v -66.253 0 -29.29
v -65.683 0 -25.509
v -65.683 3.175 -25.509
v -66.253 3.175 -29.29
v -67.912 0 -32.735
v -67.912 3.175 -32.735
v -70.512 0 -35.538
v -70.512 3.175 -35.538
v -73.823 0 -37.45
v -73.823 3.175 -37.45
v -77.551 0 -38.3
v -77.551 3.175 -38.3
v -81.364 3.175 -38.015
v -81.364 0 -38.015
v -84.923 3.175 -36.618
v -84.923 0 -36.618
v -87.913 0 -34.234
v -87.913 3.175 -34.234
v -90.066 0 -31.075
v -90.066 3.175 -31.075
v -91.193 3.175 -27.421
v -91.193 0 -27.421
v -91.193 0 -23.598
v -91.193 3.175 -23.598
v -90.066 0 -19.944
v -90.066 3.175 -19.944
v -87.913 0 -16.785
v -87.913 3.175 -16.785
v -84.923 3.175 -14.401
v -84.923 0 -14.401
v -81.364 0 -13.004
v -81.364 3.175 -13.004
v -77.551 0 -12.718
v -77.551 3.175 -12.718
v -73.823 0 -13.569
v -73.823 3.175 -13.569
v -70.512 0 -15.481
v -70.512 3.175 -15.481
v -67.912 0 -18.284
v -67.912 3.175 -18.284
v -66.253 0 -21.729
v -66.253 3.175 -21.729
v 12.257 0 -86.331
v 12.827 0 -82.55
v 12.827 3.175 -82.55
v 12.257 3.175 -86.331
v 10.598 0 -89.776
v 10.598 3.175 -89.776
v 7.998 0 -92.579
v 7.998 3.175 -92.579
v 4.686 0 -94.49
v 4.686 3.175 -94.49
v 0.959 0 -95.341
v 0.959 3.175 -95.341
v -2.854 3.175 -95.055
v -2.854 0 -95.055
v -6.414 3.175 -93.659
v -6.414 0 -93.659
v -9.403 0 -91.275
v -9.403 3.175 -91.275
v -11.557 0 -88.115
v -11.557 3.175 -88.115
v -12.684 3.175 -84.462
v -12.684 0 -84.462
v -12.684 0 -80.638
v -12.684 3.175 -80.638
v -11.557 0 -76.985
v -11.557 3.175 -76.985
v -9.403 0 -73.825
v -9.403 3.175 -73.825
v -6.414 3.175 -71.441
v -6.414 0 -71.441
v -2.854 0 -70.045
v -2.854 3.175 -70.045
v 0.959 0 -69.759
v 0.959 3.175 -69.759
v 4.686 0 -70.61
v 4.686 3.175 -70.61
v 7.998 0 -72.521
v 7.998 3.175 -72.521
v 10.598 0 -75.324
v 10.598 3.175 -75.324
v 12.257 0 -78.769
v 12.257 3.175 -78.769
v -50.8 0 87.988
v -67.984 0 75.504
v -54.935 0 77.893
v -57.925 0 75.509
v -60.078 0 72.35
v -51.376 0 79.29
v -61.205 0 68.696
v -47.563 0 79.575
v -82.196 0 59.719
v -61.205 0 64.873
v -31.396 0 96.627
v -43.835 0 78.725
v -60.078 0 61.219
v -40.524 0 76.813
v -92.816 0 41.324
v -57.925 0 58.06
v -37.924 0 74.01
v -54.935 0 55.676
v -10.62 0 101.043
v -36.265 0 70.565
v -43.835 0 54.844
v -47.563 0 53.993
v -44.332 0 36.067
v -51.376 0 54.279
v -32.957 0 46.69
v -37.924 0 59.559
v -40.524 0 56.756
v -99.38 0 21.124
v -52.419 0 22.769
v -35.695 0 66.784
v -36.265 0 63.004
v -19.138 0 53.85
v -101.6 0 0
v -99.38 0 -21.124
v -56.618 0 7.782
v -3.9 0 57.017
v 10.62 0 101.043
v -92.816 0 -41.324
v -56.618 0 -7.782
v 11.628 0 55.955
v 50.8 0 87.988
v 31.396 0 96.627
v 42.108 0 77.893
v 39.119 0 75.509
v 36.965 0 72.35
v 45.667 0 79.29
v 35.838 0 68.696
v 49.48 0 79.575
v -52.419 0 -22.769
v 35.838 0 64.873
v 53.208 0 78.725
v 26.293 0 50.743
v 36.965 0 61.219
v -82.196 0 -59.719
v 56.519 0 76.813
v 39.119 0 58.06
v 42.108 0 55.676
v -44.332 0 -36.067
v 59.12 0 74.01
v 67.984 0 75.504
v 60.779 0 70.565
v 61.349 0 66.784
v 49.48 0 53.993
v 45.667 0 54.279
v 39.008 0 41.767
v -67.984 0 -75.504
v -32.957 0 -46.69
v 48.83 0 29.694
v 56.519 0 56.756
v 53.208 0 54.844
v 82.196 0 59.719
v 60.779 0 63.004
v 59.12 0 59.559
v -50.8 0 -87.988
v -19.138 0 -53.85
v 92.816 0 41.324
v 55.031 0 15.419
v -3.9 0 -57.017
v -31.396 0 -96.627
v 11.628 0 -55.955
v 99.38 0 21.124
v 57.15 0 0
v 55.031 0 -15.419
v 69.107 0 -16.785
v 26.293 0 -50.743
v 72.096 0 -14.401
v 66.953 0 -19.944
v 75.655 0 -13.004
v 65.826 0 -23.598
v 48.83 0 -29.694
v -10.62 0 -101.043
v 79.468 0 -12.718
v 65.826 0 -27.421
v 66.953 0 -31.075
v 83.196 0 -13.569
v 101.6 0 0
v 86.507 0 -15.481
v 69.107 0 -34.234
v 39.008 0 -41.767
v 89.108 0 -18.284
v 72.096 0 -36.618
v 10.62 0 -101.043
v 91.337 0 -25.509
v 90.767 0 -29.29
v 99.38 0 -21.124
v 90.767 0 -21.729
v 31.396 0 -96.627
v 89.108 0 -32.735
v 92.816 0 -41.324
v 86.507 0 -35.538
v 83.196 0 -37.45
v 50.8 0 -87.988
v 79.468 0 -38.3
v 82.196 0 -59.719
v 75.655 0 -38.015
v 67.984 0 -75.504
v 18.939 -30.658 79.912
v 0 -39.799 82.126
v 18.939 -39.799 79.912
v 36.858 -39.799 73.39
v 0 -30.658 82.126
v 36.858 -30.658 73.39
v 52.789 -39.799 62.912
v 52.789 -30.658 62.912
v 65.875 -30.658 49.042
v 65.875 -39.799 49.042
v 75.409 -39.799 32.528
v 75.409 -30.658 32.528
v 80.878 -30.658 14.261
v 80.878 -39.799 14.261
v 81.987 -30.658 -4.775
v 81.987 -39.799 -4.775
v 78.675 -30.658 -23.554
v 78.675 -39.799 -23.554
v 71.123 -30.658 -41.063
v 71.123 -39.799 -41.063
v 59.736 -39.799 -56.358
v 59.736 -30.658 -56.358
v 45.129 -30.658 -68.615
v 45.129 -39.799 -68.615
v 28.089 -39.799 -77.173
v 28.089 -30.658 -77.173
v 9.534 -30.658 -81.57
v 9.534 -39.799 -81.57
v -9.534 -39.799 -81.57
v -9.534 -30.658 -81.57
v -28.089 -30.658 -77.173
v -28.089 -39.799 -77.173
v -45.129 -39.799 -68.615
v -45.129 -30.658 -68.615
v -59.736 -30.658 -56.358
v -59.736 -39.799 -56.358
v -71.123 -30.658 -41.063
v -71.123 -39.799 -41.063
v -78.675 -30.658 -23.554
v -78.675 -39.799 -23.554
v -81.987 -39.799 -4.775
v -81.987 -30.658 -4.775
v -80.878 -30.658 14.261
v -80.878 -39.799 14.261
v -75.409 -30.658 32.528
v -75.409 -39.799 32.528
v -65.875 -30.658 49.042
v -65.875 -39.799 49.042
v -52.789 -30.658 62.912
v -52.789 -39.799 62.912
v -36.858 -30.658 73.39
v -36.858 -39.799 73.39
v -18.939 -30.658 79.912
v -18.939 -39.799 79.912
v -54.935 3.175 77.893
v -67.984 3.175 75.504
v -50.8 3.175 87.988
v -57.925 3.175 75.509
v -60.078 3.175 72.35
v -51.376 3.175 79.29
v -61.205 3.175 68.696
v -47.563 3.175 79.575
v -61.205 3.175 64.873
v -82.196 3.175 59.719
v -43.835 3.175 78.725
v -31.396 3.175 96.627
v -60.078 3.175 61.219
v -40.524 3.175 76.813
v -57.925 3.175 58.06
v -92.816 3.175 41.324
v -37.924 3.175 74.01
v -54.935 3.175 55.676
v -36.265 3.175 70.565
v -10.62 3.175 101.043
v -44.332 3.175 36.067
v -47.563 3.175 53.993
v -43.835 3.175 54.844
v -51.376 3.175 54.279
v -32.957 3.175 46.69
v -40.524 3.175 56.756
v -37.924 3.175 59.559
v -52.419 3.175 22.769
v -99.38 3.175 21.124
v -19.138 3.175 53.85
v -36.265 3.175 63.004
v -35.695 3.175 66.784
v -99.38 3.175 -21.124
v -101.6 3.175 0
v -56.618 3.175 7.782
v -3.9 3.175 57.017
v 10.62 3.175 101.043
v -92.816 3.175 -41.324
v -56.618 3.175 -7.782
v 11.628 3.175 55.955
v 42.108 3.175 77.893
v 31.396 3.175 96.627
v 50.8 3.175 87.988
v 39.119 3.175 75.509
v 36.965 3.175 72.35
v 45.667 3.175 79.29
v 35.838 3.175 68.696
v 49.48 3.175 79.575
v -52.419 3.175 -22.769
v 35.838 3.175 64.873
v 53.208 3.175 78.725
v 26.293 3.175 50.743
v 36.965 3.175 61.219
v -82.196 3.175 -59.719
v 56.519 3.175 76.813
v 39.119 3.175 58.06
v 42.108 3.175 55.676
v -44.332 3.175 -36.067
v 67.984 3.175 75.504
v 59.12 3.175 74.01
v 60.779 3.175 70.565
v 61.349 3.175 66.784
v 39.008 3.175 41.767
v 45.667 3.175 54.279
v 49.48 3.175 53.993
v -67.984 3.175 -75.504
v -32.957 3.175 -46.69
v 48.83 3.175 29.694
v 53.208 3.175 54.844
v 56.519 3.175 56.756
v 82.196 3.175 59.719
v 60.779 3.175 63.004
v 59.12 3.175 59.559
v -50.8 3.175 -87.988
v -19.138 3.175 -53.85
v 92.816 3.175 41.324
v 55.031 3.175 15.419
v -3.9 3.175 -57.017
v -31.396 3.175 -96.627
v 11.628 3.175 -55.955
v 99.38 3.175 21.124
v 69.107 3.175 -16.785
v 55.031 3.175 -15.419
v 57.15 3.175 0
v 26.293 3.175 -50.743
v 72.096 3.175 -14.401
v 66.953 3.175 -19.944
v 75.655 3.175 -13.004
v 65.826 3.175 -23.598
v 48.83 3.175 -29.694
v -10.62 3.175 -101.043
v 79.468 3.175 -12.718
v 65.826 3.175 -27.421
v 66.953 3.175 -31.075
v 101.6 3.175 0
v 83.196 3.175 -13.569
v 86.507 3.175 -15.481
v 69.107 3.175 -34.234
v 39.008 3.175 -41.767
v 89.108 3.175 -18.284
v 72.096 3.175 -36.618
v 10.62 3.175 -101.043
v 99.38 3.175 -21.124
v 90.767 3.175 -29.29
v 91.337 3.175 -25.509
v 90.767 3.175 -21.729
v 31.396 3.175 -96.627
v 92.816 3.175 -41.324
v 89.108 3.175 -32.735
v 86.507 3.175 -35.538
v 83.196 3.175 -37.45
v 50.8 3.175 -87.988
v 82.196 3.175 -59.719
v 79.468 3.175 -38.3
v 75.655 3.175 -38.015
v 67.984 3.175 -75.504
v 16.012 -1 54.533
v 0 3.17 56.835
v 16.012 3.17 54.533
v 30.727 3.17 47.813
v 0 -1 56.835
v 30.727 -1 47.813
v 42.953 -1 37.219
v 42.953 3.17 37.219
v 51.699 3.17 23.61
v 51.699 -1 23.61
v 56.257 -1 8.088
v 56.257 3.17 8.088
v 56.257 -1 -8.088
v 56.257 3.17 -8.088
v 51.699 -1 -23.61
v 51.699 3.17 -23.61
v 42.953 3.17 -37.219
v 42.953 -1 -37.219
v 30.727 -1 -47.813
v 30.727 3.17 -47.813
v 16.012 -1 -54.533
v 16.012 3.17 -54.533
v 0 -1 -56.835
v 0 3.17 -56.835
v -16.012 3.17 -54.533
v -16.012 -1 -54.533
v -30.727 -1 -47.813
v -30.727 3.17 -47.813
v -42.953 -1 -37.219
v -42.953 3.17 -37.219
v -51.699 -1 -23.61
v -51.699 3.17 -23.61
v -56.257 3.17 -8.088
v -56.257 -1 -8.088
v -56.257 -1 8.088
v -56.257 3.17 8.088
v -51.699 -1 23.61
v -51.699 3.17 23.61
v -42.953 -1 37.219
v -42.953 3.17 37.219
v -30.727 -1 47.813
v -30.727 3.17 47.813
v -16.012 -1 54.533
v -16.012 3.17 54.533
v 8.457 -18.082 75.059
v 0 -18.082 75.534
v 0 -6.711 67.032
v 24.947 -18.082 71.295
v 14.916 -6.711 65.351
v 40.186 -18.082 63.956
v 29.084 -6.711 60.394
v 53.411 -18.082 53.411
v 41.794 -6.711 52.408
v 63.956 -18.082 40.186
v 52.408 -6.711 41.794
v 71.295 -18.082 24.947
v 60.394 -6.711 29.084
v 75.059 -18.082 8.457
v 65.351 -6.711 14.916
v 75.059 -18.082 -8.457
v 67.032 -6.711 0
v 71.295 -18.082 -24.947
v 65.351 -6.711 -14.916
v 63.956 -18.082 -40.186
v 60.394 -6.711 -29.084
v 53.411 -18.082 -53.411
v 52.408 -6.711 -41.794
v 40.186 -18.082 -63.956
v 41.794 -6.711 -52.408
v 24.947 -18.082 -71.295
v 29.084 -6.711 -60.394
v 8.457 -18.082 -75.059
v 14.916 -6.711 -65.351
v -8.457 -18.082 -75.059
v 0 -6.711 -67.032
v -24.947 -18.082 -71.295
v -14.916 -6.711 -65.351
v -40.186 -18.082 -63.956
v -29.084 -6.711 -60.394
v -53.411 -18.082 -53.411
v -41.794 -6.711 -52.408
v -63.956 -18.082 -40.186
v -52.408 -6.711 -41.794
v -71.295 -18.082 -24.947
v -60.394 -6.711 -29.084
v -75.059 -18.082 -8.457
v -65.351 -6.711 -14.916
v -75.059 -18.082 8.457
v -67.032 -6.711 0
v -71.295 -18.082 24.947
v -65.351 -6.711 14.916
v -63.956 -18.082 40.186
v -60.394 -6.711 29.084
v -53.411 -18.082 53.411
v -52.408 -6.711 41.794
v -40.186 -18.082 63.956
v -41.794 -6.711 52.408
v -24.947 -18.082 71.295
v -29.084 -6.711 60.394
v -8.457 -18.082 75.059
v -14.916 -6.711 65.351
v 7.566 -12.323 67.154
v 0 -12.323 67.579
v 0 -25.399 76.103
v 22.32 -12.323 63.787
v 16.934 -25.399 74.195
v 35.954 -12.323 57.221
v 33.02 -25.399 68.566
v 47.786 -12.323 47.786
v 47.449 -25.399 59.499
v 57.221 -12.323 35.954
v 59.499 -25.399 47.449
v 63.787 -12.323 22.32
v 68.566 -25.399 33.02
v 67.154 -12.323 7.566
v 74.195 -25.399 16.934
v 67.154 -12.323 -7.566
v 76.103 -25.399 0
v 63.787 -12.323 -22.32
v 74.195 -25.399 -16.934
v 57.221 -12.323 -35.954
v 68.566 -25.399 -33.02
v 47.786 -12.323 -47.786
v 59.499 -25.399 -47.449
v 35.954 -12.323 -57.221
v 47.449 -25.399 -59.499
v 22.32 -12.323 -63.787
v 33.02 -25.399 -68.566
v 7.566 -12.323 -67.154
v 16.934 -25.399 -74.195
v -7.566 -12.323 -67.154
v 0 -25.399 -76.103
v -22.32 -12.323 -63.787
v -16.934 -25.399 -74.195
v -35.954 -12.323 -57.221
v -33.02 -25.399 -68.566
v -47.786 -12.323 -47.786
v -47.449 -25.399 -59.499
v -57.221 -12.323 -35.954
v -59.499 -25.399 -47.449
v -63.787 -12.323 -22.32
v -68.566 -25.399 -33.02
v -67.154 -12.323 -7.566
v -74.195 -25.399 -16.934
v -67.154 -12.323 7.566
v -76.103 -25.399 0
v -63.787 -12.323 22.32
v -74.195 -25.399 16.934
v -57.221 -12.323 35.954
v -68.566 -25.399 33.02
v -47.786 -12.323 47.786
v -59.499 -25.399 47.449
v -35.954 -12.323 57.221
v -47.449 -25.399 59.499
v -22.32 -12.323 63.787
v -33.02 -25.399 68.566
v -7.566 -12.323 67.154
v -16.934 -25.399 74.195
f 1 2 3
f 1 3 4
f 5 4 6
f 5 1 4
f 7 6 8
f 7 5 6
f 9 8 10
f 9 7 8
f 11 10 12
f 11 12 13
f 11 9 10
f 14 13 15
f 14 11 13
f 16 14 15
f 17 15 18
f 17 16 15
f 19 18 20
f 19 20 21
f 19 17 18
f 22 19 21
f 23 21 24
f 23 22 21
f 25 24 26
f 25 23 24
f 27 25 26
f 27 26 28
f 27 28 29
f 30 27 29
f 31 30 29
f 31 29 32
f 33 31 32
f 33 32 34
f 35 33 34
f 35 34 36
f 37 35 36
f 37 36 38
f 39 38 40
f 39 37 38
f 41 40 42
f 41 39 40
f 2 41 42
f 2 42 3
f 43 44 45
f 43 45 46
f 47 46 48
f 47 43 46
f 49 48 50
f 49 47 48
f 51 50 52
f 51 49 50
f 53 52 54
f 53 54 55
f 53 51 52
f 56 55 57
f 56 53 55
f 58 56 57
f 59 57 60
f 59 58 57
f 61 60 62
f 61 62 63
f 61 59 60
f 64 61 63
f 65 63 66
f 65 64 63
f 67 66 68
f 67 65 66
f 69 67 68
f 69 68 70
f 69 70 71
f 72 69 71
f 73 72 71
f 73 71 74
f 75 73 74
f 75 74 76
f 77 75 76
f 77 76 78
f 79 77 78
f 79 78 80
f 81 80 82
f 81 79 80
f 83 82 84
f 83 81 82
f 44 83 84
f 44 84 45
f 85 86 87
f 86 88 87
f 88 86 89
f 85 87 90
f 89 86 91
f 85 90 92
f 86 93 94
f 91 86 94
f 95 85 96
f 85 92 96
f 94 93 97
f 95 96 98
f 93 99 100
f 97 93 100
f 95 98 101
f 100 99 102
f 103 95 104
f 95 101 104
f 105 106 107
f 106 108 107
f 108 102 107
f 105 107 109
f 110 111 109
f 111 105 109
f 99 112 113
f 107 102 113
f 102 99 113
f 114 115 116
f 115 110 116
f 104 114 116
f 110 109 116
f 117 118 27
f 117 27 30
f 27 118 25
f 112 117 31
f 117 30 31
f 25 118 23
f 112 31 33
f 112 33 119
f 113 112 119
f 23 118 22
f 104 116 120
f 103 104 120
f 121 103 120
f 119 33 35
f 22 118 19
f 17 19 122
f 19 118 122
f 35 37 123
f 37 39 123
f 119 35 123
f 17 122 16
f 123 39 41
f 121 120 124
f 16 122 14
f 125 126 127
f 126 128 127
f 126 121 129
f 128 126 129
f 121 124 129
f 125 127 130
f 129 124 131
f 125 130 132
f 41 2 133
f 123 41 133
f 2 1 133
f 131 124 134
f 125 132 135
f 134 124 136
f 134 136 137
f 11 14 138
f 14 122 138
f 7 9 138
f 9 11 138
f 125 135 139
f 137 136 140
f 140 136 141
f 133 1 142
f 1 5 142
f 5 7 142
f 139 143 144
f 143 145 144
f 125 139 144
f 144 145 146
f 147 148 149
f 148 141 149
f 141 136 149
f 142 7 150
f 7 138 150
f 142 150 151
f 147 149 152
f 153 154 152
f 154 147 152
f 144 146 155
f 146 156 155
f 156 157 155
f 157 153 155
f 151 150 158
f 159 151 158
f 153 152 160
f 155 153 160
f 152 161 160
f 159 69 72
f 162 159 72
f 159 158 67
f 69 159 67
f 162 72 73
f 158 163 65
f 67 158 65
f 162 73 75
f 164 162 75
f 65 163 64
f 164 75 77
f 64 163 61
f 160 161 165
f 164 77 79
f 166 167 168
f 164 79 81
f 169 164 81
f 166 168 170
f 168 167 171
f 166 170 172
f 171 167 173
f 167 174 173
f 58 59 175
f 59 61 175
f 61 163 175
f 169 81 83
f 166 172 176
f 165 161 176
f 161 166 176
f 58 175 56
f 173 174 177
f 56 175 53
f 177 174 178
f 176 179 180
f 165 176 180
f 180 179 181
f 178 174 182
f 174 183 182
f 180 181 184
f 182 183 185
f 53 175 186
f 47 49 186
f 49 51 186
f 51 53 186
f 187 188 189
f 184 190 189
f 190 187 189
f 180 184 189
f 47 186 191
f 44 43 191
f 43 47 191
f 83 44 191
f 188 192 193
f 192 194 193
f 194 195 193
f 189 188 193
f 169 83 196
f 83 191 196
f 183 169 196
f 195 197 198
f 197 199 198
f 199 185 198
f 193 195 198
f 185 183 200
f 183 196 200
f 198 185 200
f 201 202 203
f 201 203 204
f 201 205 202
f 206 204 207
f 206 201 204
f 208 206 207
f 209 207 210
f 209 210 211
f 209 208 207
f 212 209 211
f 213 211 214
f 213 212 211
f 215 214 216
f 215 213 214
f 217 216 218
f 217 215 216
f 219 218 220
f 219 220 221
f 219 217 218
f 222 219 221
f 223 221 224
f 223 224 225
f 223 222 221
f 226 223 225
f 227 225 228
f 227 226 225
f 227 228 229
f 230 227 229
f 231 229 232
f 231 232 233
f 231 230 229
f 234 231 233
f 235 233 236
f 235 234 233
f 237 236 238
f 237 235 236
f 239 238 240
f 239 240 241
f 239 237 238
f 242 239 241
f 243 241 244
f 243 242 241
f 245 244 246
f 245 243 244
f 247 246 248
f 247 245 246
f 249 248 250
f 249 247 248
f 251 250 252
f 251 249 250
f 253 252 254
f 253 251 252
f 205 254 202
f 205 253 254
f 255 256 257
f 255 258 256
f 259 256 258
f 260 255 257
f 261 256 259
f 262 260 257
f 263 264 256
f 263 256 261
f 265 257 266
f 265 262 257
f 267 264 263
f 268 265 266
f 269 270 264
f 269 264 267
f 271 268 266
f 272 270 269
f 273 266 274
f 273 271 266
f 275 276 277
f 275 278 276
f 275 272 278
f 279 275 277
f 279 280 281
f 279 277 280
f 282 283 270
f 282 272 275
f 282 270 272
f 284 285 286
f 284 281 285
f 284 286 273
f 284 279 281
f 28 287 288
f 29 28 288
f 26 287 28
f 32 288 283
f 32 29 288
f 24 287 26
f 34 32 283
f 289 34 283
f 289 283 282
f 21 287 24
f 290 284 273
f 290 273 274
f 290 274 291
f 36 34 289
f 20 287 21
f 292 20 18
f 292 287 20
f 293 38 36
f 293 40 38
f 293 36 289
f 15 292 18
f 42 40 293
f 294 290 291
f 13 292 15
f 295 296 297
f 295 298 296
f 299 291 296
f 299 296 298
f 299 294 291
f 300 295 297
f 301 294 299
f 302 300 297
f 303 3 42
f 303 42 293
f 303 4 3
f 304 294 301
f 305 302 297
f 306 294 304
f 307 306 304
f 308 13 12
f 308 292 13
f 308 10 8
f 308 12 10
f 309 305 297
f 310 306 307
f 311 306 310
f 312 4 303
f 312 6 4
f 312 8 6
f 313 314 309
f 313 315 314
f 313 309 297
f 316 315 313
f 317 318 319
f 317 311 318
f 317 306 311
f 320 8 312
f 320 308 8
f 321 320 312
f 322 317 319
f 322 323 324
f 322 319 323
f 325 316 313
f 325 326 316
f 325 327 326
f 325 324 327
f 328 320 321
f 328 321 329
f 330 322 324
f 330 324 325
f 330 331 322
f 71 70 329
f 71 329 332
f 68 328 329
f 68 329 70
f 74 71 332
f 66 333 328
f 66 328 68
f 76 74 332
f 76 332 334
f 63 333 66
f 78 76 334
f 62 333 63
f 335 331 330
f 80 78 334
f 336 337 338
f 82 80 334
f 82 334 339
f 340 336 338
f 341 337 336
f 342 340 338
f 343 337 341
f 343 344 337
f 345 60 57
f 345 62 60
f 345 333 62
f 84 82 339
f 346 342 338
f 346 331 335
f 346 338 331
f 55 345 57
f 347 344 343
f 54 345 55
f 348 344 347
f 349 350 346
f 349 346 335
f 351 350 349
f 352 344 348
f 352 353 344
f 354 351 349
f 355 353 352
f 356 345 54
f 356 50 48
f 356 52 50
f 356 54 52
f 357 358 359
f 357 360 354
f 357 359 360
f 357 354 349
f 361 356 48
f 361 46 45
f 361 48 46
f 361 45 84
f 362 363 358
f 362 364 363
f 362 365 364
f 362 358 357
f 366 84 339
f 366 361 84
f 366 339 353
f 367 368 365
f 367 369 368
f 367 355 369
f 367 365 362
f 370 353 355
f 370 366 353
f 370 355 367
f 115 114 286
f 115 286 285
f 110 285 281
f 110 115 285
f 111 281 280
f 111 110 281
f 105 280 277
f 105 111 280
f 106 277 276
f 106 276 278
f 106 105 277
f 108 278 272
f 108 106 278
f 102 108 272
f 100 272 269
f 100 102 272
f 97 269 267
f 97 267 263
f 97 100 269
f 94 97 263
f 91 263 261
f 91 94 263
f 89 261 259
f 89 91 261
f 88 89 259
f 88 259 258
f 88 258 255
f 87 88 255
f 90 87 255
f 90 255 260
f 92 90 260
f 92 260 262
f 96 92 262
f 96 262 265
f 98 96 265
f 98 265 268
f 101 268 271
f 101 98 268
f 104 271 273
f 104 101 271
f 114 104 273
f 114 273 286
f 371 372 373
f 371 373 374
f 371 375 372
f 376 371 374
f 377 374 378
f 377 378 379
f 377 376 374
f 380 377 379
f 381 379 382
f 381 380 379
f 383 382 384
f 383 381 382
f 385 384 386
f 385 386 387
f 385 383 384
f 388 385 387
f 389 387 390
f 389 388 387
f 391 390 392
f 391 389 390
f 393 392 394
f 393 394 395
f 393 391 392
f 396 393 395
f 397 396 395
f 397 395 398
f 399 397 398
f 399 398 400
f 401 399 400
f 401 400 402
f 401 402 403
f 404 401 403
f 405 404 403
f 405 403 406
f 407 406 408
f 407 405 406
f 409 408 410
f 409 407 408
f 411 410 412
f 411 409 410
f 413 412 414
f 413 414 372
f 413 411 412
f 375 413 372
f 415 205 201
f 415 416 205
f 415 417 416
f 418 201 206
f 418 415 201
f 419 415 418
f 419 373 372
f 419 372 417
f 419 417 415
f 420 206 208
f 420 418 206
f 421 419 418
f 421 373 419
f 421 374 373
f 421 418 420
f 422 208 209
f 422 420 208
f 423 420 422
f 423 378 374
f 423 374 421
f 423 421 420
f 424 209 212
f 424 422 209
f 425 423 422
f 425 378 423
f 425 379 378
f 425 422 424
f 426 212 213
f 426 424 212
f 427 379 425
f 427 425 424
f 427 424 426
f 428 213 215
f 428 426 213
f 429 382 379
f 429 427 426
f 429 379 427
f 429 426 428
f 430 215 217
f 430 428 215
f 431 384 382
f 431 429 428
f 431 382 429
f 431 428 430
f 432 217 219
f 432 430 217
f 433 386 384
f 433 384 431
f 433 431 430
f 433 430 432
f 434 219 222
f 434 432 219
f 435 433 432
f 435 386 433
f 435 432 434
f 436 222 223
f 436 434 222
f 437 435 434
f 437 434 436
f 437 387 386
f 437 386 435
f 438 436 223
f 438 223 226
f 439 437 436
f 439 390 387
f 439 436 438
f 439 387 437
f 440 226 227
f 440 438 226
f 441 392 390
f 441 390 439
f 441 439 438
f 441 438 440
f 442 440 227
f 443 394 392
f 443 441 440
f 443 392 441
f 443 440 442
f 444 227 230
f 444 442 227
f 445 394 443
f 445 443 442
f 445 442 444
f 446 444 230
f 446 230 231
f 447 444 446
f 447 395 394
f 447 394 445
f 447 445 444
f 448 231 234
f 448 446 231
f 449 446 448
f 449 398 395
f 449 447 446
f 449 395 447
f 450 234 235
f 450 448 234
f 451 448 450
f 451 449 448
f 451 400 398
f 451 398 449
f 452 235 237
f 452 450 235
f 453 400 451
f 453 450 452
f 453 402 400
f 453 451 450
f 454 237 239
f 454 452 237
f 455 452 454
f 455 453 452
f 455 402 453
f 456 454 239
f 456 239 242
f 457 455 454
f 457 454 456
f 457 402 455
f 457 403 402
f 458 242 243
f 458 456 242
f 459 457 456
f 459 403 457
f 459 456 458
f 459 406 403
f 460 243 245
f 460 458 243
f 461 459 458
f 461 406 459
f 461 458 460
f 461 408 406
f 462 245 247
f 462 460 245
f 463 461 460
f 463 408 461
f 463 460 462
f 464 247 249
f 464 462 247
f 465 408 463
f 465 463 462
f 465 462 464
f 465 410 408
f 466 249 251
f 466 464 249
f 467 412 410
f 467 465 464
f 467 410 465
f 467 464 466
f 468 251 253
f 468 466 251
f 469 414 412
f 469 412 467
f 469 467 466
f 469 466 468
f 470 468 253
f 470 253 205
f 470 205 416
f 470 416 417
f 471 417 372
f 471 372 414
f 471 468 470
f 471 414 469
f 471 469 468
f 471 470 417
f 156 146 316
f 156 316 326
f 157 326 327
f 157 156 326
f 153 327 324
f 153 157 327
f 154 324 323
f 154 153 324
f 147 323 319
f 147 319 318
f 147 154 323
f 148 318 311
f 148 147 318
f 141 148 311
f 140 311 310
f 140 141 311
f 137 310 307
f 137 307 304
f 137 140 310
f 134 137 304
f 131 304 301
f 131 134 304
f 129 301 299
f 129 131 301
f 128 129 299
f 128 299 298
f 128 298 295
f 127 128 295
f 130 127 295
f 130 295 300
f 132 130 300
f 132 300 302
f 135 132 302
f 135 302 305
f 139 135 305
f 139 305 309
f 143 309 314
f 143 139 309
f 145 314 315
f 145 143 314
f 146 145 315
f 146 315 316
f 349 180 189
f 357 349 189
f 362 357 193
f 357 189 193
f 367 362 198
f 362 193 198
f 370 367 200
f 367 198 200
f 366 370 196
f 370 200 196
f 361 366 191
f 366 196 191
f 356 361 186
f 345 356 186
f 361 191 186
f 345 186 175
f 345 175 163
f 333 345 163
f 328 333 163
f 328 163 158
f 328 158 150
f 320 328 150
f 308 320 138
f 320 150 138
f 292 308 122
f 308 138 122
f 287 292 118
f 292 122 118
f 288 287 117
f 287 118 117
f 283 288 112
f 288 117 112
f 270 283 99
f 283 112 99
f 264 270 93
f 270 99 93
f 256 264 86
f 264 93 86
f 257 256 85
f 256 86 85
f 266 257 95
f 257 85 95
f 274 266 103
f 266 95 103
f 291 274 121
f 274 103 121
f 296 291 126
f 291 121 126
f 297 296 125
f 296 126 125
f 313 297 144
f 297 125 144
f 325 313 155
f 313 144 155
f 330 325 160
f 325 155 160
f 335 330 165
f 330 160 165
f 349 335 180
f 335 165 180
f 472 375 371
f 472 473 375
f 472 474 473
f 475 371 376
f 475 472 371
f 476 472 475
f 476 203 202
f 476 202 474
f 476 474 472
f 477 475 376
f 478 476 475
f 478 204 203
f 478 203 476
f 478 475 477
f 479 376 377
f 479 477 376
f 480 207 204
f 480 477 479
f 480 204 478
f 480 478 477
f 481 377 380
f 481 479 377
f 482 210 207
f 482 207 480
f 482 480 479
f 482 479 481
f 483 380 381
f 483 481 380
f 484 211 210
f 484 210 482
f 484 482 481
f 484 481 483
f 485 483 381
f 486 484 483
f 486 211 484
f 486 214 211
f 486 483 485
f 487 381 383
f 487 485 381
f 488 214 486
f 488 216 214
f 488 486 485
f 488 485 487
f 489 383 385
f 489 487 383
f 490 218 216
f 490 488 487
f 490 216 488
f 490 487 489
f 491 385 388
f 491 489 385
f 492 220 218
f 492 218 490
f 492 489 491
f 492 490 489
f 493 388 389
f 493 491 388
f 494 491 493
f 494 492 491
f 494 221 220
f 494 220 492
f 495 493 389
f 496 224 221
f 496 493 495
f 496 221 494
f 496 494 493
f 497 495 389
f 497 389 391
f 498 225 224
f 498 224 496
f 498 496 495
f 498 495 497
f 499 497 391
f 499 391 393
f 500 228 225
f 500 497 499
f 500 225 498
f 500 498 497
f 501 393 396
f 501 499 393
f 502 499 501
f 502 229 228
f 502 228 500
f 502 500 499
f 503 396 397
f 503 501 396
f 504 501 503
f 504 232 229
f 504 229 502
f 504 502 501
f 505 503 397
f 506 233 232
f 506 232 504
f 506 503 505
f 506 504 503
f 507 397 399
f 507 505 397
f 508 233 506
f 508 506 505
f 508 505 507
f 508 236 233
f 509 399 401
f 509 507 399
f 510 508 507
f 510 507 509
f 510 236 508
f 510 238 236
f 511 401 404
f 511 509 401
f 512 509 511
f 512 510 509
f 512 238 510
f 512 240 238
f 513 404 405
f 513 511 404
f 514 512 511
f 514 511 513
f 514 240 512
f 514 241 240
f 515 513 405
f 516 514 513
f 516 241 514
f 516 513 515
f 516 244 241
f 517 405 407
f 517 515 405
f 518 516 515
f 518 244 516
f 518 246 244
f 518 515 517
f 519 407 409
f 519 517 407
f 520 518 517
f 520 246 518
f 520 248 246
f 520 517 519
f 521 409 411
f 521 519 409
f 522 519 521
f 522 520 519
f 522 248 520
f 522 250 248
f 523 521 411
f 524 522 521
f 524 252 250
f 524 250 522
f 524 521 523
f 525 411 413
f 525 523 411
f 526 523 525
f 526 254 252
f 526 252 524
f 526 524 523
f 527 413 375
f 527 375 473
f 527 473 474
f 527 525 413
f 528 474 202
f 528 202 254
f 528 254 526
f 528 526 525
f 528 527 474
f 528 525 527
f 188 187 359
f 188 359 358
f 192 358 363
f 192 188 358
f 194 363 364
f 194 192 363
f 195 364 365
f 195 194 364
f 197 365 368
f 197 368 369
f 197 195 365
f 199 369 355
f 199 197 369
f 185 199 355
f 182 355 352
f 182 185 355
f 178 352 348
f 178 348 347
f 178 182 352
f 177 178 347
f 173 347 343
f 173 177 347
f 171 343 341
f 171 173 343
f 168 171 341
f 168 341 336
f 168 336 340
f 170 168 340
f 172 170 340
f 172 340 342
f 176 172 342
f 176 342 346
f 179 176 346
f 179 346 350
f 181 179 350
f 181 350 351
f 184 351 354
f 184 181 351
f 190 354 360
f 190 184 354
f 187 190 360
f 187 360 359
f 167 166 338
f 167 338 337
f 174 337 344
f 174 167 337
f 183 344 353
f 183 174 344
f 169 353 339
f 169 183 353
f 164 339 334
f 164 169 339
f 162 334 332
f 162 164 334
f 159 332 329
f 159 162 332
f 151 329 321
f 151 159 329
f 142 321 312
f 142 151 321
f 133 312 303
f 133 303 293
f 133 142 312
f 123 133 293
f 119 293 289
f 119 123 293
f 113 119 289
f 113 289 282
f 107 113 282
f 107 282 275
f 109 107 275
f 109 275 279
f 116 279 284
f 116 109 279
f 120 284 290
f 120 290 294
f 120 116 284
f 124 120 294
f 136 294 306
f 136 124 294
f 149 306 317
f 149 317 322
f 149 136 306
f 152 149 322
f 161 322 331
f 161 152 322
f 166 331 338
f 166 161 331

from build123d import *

# Parameters (mm, degrees)
SKETCH2_R           = 101.6
SKETCH2_R_2         = 57.15
SKETCH2_R_3         = 12.827
BOSS_EXTRUDE1_DEPTH = 3.175


with BuildPart() as part:
    # Sketch1 → Revolve1 (revolve)
    with BuildSketch(Plane(origin=(0, -65.689447684, 0), x_dir=(0, 0, -1), z_dir=(1, 0, 0))):
        with BuildLine():
            Line((-82.125635067, 25.890387499), (-82.125635067, 35.031290154))
            ThreePointArc((-82.125635067, 35.031290154), (-71.509443379, 53.46223651), (-56.835063666, 68.859180674))
            Line((-56.835063666, 68.859180674), (-56.835063666, 64.689316259))
            ThreePointArc((-56.835063666, 64.689316259), (-72.137772119, 47.022057948), (-82.125635067, 25.890387499))
        make_face()
    revolve(axis=Axis((0, -65.689447684, 0), (0, 1, 0)))


with BuildPart() as body_2:
    # Sketch2 → Boss-Extrude1 (new body)
    with BuildSketch(Plane(origin=(0, 0, 0), x_dir=(1, 0, 0), z_dir=(0, 1, 0))):
        Circle(SKETCH2_R)
        Circle(SKETCH2_R_2, mode=Mode.SUBTRACT)
        with Locations((-78.50971542, 25.509352886)):
            Circle(SKETCH2_R_3, mode=Mode.SUBTRACT)
        with Locations((-48.521672577, -66.784352886)):
            Circle(SKETCH2_R_3, mode=Mode.SUBTRACT)
        with Locations((48.521672577, -66.784352886)):
            Circle(SKETCH2_R_3, mode=Mode.SUBTRACT)
        with Locations((78.50971542, 25.509352886)):
            Circle(SKETCH2_R_3, mode=Mode.SUBTRACT)
        with Locations((0, 82.55)):
            Circle(SKETCH2_R_3, mode=Mode.SUBTRACT)
    extrude(amount=BOSS_EXTRUDE1_DEPTH)


solid = Compound([part.part, body_2.part])
